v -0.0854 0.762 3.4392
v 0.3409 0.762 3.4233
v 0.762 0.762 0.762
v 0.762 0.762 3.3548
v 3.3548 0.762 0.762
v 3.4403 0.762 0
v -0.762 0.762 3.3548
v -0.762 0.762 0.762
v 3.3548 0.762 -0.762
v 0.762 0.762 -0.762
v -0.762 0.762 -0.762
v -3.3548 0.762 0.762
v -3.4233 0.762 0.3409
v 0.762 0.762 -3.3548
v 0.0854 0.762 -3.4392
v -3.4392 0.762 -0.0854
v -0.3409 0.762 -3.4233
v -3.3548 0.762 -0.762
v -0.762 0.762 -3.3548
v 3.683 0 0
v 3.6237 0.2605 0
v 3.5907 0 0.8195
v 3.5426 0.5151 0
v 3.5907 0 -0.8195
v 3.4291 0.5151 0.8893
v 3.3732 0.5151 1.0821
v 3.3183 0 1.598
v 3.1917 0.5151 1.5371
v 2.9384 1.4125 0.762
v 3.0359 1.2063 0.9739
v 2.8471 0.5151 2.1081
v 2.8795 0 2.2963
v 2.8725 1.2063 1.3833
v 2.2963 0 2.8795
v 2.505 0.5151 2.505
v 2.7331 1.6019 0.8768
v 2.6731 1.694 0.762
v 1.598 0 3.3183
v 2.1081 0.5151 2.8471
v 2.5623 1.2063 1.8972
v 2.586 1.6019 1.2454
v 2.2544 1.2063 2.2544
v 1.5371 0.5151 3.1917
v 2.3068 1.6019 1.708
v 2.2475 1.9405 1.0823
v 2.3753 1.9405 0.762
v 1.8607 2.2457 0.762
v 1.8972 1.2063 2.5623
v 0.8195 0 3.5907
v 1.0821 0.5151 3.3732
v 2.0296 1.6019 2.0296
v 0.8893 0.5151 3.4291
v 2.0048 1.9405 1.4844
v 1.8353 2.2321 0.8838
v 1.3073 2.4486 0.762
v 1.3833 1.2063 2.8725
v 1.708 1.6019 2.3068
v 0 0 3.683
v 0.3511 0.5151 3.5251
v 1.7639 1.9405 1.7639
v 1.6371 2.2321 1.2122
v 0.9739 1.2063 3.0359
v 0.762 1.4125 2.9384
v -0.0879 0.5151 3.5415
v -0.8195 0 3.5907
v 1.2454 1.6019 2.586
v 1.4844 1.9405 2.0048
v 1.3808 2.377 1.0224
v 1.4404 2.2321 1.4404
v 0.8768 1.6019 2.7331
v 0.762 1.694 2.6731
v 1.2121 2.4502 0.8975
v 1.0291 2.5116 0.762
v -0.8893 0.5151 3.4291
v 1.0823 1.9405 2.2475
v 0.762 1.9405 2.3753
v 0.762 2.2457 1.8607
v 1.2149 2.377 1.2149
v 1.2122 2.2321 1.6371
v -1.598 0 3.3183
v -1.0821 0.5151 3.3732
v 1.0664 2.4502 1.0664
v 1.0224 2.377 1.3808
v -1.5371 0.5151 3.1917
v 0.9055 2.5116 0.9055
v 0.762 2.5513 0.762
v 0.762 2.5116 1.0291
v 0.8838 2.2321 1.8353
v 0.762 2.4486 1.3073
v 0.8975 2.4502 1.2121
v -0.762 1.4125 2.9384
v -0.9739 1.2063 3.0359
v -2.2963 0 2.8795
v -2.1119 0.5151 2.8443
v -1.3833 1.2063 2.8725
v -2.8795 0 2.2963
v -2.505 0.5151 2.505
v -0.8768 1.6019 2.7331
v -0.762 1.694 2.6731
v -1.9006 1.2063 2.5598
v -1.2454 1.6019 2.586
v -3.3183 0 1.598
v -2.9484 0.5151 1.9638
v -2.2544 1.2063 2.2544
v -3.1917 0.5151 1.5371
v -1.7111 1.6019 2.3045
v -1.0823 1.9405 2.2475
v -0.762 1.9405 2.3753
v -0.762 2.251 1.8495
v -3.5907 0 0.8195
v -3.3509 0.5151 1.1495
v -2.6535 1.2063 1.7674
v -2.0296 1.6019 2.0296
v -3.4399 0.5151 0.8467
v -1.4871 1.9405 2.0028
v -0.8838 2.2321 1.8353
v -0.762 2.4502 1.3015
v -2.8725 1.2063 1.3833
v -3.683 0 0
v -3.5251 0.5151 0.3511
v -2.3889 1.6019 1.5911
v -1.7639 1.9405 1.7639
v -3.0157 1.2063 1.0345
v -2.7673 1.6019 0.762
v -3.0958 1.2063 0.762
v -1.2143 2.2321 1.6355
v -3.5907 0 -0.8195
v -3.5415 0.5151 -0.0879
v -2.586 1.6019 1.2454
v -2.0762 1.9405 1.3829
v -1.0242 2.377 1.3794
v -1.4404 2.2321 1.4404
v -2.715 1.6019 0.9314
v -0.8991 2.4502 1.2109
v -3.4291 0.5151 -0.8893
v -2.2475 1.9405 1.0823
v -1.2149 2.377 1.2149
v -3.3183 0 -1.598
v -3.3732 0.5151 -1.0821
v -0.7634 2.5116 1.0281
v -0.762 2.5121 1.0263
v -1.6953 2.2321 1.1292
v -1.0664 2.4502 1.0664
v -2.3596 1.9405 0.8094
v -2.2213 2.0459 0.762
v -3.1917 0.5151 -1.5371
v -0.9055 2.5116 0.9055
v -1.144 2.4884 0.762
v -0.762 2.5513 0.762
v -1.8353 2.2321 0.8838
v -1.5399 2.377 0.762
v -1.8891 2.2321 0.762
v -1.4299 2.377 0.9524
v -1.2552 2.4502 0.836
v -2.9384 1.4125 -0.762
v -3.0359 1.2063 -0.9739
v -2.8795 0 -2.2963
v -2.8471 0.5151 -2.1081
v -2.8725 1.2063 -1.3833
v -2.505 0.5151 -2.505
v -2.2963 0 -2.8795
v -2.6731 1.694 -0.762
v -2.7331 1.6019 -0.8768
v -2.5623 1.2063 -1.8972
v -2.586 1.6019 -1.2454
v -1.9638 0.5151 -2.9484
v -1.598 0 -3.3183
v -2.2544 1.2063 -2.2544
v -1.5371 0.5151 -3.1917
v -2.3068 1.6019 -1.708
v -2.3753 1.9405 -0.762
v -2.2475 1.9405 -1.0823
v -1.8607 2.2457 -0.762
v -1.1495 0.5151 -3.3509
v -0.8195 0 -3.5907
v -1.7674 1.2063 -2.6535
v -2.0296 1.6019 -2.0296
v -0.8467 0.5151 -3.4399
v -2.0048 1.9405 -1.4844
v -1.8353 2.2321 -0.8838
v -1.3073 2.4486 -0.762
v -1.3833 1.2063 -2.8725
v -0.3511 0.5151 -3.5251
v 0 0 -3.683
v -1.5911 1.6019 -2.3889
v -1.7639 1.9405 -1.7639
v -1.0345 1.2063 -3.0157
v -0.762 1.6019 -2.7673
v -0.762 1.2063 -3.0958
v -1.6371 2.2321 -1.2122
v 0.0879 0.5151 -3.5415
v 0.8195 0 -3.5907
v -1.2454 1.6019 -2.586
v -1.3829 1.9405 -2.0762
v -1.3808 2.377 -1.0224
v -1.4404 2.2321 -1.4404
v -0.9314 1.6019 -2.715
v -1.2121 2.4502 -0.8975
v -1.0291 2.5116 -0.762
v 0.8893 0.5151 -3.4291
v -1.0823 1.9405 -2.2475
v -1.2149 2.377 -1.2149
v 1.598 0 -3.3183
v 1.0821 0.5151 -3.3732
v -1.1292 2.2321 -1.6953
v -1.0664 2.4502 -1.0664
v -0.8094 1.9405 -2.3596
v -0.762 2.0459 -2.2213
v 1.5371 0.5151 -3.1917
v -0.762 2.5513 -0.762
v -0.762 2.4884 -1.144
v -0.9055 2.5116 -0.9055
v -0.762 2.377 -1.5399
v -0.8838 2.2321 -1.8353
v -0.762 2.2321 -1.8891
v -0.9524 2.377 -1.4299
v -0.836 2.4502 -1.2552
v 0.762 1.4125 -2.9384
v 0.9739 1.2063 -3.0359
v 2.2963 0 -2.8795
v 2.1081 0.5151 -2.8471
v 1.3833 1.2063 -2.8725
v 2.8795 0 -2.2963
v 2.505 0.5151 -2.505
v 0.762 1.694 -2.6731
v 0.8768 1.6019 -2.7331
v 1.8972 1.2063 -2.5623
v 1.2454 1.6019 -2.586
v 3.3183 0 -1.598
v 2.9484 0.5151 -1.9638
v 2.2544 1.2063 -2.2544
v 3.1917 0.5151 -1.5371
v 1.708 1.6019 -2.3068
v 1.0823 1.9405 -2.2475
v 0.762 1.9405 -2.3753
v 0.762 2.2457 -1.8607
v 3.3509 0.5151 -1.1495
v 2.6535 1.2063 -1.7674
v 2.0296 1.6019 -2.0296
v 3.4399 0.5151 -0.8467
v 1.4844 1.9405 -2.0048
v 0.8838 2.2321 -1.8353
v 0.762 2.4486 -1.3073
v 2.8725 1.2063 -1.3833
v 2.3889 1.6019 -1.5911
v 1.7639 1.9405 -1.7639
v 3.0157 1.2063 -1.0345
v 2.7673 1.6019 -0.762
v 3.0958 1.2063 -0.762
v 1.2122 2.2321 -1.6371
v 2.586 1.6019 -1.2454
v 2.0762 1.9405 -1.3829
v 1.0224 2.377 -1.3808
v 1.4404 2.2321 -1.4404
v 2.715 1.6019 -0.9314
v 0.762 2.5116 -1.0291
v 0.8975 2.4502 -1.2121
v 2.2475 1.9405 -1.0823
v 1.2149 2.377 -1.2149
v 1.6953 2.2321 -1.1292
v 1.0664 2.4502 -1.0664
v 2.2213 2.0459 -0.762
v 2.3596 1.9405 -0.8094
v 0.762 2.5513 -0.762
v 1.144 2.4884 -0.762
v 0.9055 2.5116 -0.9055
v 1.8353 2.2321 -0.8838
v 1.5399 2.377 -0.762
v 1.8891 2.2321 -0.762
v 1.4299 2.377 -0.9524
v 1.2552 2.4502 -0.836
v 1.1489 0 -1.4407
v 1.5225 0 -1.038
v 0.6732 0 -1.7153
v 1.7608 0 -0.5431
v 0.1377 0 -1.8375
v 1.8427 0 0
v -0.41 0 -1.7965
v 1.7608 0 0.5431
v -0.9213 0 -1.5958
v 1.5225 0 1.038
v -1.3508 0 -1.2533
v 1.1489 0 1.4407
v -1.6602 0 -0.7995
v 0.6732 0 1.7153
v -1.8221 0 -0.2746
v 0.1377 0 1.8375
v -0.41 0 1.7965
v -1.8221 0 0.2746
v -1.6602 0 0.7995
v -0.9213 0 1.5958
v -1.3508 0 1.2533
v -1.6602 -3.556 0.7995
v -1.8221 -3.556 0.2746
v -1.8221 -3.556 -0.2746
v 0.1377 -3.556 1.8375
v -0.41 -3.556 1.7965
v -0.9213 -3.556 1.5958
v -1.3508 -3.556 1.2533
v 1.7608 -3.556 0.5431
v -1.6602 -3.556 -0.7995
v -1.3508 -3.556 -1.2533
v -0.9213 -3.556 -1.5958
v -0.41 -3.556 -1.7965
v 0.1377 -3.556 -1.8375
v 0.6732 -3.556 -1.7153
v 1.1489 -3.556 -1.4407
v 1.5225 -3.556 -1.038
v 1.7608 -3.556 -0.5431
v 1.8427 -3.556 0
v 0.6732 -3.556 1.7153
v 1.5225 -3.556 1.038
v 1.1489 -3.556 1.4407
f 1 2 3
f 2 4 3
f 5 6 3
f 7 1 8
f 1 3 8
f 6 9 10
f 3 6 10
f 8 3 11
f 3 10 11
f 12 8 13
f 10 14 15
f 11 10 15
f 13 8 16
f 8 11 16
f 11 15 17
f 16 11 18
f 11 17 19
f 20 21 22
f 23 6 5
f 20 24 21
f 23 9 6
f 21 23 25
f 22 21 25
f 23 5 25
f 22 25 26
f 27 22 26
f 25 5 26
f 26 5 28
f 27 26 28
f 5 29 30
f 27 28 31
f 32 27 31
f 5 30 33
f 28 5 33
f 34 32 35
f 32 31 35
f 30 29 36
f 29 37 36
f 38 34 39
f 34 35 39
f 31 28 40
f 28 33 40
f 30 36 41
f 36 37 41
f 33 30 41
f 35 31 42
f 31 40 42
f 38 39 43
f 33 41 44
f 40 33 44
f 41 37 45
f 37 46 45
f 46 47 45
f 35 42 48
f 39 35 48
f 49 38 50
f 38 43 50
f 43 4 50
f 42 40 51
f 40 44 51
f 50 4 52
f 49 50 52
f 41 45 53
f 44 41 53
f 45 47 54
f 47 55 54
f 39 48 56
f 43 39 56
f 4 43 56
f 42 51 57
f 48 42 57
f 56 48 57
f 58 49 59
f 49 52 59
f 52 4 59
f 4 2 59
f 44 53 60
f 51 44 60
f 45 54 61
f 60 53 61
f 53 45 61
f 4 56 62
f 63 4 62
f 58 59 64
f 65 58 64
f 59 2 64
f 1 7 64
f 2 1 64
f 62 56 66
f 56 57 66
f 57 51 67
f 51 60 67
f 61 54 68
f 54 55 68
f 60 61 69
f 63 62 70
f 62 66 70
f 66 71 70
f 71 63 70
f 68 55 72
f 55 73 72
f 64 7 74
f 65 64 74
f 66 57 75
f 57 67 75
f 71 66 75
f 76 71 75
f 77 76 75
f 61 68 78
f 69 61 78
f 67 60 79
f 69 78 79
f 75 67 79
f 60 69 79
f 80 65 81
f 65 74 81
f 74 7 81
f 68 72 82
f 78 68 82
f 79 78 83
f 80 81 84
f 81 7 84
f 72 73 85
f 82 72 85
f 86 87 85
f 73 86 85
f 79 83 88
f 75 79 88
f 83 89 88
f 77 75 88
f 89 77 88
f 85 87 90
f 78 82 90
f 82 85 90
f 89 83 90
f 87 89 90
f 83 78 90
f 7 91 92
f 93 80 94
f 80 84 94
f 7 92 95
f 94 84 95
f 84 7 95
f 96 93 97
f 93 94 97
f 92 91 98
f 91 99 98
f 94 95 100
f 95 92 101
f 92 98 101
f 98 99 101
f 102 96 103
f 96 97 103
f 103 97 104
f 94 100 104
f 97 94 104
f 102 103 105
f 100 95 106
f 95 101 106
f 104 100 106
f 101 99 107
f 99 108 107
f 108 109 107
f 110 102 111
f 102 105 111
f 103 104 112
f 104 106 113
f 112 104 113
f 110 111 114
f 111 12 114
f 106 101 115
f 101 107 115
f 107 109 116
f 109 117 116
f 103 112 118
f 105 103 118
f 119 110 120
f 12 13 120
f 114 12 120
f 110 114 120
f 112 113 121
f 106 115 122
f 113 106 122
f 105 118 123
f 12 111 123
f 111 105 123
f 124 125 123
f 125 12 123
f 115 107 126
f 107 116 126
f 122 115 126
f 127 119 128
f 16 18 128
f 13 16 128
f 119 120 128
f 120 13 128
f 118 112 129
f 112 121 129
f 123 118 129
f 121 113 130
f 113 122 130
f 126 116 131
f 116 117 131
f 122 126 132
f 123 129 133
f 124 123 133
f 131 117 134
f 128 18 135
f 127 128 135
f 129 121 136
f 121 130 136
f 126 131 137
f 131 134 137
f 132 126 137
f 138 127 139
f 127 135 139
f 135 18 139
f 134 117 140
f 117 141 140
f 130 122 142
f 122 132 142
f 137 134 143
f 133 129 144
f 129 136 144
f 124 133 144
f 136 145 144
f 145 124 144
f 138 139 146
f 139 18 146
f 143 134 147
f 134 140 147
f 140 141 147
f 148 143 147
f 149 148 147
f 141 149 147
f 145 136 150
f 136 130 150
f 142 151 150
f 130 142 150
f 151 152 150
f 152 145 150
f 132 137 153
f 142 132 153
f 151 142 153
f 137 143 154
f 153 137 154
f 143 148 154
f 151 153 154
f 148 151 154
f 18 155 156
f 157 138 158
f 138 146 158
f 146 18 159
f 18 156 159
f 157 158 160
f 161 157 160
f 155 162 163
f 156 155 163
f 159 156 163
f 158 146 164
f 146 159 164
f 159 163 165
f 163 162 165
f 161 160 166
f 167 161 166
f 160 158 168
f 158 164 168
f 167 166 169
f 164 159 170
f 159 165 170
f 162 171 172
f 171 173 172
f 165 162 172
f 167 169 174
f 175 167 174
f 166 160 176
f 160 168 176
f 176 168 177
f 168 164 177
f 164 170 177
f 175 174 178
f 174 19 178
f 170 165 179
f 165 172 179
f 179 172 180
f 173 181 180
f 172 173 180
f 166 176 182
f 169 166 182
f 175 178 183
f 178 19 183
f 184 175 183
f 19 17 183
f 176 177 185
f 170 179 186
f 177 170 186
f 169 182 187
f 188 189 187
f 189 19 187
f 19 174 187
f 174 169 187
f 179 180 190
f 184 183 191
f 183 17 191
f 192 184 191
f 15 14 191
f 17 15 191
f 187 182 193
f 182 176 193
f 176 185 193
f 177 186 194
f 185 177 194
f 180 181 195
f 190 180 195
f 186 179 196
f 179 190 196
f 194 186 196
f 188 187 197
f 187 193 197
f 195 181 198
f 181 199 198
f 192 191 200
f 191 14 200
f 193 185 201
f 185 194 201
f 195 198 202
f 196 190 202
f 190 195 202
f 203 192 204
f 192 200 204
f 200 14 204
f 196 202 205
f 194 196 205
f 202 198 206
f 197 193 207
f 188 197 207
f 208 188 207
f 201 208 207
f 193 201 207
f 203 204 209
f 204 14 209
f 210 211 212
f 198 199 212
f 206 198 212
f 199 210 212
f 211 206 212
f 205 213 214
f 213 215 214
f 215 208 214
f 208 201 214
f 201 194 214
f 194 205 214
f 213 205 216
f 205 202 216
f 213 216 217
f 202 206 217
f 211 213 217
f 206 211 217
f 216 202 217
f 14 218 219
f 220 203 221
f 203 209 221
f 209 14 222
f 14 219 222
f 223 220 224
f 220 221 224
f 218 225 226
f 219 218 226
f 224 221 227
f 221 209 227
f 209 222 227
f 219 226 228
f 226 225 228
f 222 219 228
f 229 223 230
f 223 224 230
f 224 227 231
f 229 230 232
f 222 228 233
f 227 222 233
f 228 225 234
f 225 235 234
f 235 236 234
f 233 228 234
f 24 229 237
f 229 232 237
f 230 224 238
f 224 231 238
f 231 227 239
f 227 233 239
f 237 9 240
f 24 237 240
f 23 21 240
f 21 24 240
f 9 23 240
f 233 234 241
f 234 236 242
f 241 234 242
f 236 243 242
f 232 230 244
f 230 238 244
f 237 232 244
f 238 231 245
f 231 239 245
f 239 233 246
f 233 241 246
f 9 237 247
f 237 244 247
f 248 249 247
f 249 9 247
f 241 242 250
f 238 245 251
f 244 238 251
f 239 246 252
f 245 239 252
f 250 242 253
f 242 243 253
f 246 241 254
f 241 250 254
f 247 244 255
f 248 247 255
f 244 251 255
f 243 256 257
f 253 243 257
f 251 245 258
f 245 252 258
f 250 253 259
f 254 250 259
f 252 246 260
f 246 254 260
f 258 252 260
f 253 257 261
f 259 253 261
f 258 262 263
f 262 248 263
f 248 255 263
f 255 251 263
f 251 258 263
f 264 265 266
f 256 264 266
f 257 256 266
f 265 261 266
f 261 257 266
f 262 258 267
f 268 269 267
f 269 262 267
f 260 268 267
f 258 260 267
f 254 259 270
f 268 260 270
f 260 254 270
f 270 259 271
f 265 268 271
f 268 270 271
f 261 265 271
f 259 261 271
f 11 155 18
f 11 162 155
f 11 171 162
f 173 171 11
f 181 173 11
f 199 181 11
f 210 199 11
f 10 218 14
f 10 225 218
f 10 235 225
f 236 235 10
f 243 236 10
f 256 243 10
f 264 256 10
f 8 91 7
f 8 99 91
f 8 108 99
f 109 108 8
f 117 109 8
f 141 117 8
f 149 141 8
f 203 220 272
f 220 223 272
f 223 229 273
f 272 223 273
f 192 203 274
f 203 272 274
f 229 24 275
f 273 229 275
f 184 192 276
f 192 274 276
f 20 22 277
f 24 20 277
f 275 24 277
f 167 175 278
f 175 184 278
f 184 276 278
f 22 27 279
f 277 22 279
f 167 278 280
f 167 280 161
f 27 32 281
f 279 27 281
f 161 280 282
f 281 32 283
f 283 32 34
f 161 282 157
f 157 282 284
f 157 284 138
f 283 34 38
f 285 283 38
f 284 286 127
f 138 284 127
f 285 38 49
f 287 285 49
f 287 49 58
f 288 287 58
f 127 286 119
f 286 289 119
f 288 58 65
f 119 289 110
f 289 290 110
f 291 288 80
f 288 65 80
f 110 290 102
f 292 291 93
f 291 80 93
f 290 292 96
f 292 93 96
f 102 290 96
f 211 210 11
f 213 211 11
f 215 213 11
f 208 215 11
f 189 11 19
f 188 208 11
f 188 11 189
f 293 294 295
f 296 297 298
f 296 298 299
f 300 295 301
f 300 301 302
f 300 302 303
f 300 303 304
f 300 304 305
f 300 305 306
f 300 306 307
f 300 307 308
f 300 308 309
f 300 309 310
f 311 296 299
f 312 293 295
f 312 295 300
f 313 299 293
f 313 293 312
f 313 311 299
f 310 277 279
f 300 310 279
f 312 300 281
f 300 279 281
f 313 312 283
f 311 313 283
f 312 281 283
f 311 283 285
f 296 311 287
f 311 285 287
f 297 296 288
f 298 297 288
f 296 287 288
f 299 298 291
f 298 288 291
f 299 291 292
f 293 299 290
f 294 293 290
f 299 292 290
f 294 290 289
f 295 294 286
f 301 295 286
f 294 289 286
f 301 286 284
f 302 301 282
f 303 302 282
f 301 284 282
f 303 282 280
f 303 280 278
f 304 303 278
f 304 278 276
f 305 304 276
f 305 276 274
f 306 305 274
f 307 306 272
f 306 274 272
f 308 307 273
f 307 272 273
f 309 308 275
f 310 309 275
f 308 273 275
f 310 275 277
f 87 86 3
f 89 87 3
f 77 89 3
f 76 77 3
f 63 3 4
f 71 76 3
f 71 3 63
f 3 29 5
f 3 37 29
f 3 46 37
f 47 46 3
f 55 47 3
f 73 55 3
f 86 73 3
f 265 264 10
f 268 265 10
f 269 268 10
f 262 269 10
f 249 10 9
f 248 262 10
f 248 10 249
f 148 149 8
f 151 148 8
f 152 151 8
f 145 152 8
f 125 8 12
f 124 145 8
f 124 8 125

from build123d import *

# Parameters (mm, degrees)
CUT_EXTRUDE1_DEPTH  = 3.048
SKETCH3_R           = 1.842682312
BOSS_EXTRUDE1_DEPTH = 3.556


with BuildPart() as part:
    # Sketch1 → Revolve1 (revolve)
    with BuildSketch(Plane.XY):
        with BuildLine():
            Line((0, 0), (3.683, 0))
            ThreePointArc((3.683, 0), (2.367551224, 2.032774275), (0, 2.54))
            Line((0, 2.54), (0, 0))
        make_face()
    revolve(axis=Axis((0, 23.833116883, 0), (0, -1, 0)))

    # Sketch2 → Cut-Extrude1 (cut)
    with BuildSketch(Plane(origin=(0, 3.81, 0), x_dir=(-1, 0, 0), z_dir=(0, -1, 0))):
        Polygon((-0.762, -0.762), (-0.762, -3.958262237), (0.762, -3.958262237), (0.762, -0.762), (5.504133478, -0.762), (5.504133478, 0.762), (0.762, 0.762), (0.762, 3.972126553), (-0.762, 3.972126553), (-0.762, 0.762), (-5.060475364, 0.762), (-5.060475364, -0.762), align=None)
    extrude(amount=CUT_EXTRUDE1_DEPTH, mode=Mode.SUBTRACT)

    # Sketch3 → Boss-Extrude1 (add)
    with BuildSketch(Plane.XZ):
        Circle(SKETCH3_R)
    extrude(amount=BOSS_EXTRUDE1_DEPTH)


solid = part.part
